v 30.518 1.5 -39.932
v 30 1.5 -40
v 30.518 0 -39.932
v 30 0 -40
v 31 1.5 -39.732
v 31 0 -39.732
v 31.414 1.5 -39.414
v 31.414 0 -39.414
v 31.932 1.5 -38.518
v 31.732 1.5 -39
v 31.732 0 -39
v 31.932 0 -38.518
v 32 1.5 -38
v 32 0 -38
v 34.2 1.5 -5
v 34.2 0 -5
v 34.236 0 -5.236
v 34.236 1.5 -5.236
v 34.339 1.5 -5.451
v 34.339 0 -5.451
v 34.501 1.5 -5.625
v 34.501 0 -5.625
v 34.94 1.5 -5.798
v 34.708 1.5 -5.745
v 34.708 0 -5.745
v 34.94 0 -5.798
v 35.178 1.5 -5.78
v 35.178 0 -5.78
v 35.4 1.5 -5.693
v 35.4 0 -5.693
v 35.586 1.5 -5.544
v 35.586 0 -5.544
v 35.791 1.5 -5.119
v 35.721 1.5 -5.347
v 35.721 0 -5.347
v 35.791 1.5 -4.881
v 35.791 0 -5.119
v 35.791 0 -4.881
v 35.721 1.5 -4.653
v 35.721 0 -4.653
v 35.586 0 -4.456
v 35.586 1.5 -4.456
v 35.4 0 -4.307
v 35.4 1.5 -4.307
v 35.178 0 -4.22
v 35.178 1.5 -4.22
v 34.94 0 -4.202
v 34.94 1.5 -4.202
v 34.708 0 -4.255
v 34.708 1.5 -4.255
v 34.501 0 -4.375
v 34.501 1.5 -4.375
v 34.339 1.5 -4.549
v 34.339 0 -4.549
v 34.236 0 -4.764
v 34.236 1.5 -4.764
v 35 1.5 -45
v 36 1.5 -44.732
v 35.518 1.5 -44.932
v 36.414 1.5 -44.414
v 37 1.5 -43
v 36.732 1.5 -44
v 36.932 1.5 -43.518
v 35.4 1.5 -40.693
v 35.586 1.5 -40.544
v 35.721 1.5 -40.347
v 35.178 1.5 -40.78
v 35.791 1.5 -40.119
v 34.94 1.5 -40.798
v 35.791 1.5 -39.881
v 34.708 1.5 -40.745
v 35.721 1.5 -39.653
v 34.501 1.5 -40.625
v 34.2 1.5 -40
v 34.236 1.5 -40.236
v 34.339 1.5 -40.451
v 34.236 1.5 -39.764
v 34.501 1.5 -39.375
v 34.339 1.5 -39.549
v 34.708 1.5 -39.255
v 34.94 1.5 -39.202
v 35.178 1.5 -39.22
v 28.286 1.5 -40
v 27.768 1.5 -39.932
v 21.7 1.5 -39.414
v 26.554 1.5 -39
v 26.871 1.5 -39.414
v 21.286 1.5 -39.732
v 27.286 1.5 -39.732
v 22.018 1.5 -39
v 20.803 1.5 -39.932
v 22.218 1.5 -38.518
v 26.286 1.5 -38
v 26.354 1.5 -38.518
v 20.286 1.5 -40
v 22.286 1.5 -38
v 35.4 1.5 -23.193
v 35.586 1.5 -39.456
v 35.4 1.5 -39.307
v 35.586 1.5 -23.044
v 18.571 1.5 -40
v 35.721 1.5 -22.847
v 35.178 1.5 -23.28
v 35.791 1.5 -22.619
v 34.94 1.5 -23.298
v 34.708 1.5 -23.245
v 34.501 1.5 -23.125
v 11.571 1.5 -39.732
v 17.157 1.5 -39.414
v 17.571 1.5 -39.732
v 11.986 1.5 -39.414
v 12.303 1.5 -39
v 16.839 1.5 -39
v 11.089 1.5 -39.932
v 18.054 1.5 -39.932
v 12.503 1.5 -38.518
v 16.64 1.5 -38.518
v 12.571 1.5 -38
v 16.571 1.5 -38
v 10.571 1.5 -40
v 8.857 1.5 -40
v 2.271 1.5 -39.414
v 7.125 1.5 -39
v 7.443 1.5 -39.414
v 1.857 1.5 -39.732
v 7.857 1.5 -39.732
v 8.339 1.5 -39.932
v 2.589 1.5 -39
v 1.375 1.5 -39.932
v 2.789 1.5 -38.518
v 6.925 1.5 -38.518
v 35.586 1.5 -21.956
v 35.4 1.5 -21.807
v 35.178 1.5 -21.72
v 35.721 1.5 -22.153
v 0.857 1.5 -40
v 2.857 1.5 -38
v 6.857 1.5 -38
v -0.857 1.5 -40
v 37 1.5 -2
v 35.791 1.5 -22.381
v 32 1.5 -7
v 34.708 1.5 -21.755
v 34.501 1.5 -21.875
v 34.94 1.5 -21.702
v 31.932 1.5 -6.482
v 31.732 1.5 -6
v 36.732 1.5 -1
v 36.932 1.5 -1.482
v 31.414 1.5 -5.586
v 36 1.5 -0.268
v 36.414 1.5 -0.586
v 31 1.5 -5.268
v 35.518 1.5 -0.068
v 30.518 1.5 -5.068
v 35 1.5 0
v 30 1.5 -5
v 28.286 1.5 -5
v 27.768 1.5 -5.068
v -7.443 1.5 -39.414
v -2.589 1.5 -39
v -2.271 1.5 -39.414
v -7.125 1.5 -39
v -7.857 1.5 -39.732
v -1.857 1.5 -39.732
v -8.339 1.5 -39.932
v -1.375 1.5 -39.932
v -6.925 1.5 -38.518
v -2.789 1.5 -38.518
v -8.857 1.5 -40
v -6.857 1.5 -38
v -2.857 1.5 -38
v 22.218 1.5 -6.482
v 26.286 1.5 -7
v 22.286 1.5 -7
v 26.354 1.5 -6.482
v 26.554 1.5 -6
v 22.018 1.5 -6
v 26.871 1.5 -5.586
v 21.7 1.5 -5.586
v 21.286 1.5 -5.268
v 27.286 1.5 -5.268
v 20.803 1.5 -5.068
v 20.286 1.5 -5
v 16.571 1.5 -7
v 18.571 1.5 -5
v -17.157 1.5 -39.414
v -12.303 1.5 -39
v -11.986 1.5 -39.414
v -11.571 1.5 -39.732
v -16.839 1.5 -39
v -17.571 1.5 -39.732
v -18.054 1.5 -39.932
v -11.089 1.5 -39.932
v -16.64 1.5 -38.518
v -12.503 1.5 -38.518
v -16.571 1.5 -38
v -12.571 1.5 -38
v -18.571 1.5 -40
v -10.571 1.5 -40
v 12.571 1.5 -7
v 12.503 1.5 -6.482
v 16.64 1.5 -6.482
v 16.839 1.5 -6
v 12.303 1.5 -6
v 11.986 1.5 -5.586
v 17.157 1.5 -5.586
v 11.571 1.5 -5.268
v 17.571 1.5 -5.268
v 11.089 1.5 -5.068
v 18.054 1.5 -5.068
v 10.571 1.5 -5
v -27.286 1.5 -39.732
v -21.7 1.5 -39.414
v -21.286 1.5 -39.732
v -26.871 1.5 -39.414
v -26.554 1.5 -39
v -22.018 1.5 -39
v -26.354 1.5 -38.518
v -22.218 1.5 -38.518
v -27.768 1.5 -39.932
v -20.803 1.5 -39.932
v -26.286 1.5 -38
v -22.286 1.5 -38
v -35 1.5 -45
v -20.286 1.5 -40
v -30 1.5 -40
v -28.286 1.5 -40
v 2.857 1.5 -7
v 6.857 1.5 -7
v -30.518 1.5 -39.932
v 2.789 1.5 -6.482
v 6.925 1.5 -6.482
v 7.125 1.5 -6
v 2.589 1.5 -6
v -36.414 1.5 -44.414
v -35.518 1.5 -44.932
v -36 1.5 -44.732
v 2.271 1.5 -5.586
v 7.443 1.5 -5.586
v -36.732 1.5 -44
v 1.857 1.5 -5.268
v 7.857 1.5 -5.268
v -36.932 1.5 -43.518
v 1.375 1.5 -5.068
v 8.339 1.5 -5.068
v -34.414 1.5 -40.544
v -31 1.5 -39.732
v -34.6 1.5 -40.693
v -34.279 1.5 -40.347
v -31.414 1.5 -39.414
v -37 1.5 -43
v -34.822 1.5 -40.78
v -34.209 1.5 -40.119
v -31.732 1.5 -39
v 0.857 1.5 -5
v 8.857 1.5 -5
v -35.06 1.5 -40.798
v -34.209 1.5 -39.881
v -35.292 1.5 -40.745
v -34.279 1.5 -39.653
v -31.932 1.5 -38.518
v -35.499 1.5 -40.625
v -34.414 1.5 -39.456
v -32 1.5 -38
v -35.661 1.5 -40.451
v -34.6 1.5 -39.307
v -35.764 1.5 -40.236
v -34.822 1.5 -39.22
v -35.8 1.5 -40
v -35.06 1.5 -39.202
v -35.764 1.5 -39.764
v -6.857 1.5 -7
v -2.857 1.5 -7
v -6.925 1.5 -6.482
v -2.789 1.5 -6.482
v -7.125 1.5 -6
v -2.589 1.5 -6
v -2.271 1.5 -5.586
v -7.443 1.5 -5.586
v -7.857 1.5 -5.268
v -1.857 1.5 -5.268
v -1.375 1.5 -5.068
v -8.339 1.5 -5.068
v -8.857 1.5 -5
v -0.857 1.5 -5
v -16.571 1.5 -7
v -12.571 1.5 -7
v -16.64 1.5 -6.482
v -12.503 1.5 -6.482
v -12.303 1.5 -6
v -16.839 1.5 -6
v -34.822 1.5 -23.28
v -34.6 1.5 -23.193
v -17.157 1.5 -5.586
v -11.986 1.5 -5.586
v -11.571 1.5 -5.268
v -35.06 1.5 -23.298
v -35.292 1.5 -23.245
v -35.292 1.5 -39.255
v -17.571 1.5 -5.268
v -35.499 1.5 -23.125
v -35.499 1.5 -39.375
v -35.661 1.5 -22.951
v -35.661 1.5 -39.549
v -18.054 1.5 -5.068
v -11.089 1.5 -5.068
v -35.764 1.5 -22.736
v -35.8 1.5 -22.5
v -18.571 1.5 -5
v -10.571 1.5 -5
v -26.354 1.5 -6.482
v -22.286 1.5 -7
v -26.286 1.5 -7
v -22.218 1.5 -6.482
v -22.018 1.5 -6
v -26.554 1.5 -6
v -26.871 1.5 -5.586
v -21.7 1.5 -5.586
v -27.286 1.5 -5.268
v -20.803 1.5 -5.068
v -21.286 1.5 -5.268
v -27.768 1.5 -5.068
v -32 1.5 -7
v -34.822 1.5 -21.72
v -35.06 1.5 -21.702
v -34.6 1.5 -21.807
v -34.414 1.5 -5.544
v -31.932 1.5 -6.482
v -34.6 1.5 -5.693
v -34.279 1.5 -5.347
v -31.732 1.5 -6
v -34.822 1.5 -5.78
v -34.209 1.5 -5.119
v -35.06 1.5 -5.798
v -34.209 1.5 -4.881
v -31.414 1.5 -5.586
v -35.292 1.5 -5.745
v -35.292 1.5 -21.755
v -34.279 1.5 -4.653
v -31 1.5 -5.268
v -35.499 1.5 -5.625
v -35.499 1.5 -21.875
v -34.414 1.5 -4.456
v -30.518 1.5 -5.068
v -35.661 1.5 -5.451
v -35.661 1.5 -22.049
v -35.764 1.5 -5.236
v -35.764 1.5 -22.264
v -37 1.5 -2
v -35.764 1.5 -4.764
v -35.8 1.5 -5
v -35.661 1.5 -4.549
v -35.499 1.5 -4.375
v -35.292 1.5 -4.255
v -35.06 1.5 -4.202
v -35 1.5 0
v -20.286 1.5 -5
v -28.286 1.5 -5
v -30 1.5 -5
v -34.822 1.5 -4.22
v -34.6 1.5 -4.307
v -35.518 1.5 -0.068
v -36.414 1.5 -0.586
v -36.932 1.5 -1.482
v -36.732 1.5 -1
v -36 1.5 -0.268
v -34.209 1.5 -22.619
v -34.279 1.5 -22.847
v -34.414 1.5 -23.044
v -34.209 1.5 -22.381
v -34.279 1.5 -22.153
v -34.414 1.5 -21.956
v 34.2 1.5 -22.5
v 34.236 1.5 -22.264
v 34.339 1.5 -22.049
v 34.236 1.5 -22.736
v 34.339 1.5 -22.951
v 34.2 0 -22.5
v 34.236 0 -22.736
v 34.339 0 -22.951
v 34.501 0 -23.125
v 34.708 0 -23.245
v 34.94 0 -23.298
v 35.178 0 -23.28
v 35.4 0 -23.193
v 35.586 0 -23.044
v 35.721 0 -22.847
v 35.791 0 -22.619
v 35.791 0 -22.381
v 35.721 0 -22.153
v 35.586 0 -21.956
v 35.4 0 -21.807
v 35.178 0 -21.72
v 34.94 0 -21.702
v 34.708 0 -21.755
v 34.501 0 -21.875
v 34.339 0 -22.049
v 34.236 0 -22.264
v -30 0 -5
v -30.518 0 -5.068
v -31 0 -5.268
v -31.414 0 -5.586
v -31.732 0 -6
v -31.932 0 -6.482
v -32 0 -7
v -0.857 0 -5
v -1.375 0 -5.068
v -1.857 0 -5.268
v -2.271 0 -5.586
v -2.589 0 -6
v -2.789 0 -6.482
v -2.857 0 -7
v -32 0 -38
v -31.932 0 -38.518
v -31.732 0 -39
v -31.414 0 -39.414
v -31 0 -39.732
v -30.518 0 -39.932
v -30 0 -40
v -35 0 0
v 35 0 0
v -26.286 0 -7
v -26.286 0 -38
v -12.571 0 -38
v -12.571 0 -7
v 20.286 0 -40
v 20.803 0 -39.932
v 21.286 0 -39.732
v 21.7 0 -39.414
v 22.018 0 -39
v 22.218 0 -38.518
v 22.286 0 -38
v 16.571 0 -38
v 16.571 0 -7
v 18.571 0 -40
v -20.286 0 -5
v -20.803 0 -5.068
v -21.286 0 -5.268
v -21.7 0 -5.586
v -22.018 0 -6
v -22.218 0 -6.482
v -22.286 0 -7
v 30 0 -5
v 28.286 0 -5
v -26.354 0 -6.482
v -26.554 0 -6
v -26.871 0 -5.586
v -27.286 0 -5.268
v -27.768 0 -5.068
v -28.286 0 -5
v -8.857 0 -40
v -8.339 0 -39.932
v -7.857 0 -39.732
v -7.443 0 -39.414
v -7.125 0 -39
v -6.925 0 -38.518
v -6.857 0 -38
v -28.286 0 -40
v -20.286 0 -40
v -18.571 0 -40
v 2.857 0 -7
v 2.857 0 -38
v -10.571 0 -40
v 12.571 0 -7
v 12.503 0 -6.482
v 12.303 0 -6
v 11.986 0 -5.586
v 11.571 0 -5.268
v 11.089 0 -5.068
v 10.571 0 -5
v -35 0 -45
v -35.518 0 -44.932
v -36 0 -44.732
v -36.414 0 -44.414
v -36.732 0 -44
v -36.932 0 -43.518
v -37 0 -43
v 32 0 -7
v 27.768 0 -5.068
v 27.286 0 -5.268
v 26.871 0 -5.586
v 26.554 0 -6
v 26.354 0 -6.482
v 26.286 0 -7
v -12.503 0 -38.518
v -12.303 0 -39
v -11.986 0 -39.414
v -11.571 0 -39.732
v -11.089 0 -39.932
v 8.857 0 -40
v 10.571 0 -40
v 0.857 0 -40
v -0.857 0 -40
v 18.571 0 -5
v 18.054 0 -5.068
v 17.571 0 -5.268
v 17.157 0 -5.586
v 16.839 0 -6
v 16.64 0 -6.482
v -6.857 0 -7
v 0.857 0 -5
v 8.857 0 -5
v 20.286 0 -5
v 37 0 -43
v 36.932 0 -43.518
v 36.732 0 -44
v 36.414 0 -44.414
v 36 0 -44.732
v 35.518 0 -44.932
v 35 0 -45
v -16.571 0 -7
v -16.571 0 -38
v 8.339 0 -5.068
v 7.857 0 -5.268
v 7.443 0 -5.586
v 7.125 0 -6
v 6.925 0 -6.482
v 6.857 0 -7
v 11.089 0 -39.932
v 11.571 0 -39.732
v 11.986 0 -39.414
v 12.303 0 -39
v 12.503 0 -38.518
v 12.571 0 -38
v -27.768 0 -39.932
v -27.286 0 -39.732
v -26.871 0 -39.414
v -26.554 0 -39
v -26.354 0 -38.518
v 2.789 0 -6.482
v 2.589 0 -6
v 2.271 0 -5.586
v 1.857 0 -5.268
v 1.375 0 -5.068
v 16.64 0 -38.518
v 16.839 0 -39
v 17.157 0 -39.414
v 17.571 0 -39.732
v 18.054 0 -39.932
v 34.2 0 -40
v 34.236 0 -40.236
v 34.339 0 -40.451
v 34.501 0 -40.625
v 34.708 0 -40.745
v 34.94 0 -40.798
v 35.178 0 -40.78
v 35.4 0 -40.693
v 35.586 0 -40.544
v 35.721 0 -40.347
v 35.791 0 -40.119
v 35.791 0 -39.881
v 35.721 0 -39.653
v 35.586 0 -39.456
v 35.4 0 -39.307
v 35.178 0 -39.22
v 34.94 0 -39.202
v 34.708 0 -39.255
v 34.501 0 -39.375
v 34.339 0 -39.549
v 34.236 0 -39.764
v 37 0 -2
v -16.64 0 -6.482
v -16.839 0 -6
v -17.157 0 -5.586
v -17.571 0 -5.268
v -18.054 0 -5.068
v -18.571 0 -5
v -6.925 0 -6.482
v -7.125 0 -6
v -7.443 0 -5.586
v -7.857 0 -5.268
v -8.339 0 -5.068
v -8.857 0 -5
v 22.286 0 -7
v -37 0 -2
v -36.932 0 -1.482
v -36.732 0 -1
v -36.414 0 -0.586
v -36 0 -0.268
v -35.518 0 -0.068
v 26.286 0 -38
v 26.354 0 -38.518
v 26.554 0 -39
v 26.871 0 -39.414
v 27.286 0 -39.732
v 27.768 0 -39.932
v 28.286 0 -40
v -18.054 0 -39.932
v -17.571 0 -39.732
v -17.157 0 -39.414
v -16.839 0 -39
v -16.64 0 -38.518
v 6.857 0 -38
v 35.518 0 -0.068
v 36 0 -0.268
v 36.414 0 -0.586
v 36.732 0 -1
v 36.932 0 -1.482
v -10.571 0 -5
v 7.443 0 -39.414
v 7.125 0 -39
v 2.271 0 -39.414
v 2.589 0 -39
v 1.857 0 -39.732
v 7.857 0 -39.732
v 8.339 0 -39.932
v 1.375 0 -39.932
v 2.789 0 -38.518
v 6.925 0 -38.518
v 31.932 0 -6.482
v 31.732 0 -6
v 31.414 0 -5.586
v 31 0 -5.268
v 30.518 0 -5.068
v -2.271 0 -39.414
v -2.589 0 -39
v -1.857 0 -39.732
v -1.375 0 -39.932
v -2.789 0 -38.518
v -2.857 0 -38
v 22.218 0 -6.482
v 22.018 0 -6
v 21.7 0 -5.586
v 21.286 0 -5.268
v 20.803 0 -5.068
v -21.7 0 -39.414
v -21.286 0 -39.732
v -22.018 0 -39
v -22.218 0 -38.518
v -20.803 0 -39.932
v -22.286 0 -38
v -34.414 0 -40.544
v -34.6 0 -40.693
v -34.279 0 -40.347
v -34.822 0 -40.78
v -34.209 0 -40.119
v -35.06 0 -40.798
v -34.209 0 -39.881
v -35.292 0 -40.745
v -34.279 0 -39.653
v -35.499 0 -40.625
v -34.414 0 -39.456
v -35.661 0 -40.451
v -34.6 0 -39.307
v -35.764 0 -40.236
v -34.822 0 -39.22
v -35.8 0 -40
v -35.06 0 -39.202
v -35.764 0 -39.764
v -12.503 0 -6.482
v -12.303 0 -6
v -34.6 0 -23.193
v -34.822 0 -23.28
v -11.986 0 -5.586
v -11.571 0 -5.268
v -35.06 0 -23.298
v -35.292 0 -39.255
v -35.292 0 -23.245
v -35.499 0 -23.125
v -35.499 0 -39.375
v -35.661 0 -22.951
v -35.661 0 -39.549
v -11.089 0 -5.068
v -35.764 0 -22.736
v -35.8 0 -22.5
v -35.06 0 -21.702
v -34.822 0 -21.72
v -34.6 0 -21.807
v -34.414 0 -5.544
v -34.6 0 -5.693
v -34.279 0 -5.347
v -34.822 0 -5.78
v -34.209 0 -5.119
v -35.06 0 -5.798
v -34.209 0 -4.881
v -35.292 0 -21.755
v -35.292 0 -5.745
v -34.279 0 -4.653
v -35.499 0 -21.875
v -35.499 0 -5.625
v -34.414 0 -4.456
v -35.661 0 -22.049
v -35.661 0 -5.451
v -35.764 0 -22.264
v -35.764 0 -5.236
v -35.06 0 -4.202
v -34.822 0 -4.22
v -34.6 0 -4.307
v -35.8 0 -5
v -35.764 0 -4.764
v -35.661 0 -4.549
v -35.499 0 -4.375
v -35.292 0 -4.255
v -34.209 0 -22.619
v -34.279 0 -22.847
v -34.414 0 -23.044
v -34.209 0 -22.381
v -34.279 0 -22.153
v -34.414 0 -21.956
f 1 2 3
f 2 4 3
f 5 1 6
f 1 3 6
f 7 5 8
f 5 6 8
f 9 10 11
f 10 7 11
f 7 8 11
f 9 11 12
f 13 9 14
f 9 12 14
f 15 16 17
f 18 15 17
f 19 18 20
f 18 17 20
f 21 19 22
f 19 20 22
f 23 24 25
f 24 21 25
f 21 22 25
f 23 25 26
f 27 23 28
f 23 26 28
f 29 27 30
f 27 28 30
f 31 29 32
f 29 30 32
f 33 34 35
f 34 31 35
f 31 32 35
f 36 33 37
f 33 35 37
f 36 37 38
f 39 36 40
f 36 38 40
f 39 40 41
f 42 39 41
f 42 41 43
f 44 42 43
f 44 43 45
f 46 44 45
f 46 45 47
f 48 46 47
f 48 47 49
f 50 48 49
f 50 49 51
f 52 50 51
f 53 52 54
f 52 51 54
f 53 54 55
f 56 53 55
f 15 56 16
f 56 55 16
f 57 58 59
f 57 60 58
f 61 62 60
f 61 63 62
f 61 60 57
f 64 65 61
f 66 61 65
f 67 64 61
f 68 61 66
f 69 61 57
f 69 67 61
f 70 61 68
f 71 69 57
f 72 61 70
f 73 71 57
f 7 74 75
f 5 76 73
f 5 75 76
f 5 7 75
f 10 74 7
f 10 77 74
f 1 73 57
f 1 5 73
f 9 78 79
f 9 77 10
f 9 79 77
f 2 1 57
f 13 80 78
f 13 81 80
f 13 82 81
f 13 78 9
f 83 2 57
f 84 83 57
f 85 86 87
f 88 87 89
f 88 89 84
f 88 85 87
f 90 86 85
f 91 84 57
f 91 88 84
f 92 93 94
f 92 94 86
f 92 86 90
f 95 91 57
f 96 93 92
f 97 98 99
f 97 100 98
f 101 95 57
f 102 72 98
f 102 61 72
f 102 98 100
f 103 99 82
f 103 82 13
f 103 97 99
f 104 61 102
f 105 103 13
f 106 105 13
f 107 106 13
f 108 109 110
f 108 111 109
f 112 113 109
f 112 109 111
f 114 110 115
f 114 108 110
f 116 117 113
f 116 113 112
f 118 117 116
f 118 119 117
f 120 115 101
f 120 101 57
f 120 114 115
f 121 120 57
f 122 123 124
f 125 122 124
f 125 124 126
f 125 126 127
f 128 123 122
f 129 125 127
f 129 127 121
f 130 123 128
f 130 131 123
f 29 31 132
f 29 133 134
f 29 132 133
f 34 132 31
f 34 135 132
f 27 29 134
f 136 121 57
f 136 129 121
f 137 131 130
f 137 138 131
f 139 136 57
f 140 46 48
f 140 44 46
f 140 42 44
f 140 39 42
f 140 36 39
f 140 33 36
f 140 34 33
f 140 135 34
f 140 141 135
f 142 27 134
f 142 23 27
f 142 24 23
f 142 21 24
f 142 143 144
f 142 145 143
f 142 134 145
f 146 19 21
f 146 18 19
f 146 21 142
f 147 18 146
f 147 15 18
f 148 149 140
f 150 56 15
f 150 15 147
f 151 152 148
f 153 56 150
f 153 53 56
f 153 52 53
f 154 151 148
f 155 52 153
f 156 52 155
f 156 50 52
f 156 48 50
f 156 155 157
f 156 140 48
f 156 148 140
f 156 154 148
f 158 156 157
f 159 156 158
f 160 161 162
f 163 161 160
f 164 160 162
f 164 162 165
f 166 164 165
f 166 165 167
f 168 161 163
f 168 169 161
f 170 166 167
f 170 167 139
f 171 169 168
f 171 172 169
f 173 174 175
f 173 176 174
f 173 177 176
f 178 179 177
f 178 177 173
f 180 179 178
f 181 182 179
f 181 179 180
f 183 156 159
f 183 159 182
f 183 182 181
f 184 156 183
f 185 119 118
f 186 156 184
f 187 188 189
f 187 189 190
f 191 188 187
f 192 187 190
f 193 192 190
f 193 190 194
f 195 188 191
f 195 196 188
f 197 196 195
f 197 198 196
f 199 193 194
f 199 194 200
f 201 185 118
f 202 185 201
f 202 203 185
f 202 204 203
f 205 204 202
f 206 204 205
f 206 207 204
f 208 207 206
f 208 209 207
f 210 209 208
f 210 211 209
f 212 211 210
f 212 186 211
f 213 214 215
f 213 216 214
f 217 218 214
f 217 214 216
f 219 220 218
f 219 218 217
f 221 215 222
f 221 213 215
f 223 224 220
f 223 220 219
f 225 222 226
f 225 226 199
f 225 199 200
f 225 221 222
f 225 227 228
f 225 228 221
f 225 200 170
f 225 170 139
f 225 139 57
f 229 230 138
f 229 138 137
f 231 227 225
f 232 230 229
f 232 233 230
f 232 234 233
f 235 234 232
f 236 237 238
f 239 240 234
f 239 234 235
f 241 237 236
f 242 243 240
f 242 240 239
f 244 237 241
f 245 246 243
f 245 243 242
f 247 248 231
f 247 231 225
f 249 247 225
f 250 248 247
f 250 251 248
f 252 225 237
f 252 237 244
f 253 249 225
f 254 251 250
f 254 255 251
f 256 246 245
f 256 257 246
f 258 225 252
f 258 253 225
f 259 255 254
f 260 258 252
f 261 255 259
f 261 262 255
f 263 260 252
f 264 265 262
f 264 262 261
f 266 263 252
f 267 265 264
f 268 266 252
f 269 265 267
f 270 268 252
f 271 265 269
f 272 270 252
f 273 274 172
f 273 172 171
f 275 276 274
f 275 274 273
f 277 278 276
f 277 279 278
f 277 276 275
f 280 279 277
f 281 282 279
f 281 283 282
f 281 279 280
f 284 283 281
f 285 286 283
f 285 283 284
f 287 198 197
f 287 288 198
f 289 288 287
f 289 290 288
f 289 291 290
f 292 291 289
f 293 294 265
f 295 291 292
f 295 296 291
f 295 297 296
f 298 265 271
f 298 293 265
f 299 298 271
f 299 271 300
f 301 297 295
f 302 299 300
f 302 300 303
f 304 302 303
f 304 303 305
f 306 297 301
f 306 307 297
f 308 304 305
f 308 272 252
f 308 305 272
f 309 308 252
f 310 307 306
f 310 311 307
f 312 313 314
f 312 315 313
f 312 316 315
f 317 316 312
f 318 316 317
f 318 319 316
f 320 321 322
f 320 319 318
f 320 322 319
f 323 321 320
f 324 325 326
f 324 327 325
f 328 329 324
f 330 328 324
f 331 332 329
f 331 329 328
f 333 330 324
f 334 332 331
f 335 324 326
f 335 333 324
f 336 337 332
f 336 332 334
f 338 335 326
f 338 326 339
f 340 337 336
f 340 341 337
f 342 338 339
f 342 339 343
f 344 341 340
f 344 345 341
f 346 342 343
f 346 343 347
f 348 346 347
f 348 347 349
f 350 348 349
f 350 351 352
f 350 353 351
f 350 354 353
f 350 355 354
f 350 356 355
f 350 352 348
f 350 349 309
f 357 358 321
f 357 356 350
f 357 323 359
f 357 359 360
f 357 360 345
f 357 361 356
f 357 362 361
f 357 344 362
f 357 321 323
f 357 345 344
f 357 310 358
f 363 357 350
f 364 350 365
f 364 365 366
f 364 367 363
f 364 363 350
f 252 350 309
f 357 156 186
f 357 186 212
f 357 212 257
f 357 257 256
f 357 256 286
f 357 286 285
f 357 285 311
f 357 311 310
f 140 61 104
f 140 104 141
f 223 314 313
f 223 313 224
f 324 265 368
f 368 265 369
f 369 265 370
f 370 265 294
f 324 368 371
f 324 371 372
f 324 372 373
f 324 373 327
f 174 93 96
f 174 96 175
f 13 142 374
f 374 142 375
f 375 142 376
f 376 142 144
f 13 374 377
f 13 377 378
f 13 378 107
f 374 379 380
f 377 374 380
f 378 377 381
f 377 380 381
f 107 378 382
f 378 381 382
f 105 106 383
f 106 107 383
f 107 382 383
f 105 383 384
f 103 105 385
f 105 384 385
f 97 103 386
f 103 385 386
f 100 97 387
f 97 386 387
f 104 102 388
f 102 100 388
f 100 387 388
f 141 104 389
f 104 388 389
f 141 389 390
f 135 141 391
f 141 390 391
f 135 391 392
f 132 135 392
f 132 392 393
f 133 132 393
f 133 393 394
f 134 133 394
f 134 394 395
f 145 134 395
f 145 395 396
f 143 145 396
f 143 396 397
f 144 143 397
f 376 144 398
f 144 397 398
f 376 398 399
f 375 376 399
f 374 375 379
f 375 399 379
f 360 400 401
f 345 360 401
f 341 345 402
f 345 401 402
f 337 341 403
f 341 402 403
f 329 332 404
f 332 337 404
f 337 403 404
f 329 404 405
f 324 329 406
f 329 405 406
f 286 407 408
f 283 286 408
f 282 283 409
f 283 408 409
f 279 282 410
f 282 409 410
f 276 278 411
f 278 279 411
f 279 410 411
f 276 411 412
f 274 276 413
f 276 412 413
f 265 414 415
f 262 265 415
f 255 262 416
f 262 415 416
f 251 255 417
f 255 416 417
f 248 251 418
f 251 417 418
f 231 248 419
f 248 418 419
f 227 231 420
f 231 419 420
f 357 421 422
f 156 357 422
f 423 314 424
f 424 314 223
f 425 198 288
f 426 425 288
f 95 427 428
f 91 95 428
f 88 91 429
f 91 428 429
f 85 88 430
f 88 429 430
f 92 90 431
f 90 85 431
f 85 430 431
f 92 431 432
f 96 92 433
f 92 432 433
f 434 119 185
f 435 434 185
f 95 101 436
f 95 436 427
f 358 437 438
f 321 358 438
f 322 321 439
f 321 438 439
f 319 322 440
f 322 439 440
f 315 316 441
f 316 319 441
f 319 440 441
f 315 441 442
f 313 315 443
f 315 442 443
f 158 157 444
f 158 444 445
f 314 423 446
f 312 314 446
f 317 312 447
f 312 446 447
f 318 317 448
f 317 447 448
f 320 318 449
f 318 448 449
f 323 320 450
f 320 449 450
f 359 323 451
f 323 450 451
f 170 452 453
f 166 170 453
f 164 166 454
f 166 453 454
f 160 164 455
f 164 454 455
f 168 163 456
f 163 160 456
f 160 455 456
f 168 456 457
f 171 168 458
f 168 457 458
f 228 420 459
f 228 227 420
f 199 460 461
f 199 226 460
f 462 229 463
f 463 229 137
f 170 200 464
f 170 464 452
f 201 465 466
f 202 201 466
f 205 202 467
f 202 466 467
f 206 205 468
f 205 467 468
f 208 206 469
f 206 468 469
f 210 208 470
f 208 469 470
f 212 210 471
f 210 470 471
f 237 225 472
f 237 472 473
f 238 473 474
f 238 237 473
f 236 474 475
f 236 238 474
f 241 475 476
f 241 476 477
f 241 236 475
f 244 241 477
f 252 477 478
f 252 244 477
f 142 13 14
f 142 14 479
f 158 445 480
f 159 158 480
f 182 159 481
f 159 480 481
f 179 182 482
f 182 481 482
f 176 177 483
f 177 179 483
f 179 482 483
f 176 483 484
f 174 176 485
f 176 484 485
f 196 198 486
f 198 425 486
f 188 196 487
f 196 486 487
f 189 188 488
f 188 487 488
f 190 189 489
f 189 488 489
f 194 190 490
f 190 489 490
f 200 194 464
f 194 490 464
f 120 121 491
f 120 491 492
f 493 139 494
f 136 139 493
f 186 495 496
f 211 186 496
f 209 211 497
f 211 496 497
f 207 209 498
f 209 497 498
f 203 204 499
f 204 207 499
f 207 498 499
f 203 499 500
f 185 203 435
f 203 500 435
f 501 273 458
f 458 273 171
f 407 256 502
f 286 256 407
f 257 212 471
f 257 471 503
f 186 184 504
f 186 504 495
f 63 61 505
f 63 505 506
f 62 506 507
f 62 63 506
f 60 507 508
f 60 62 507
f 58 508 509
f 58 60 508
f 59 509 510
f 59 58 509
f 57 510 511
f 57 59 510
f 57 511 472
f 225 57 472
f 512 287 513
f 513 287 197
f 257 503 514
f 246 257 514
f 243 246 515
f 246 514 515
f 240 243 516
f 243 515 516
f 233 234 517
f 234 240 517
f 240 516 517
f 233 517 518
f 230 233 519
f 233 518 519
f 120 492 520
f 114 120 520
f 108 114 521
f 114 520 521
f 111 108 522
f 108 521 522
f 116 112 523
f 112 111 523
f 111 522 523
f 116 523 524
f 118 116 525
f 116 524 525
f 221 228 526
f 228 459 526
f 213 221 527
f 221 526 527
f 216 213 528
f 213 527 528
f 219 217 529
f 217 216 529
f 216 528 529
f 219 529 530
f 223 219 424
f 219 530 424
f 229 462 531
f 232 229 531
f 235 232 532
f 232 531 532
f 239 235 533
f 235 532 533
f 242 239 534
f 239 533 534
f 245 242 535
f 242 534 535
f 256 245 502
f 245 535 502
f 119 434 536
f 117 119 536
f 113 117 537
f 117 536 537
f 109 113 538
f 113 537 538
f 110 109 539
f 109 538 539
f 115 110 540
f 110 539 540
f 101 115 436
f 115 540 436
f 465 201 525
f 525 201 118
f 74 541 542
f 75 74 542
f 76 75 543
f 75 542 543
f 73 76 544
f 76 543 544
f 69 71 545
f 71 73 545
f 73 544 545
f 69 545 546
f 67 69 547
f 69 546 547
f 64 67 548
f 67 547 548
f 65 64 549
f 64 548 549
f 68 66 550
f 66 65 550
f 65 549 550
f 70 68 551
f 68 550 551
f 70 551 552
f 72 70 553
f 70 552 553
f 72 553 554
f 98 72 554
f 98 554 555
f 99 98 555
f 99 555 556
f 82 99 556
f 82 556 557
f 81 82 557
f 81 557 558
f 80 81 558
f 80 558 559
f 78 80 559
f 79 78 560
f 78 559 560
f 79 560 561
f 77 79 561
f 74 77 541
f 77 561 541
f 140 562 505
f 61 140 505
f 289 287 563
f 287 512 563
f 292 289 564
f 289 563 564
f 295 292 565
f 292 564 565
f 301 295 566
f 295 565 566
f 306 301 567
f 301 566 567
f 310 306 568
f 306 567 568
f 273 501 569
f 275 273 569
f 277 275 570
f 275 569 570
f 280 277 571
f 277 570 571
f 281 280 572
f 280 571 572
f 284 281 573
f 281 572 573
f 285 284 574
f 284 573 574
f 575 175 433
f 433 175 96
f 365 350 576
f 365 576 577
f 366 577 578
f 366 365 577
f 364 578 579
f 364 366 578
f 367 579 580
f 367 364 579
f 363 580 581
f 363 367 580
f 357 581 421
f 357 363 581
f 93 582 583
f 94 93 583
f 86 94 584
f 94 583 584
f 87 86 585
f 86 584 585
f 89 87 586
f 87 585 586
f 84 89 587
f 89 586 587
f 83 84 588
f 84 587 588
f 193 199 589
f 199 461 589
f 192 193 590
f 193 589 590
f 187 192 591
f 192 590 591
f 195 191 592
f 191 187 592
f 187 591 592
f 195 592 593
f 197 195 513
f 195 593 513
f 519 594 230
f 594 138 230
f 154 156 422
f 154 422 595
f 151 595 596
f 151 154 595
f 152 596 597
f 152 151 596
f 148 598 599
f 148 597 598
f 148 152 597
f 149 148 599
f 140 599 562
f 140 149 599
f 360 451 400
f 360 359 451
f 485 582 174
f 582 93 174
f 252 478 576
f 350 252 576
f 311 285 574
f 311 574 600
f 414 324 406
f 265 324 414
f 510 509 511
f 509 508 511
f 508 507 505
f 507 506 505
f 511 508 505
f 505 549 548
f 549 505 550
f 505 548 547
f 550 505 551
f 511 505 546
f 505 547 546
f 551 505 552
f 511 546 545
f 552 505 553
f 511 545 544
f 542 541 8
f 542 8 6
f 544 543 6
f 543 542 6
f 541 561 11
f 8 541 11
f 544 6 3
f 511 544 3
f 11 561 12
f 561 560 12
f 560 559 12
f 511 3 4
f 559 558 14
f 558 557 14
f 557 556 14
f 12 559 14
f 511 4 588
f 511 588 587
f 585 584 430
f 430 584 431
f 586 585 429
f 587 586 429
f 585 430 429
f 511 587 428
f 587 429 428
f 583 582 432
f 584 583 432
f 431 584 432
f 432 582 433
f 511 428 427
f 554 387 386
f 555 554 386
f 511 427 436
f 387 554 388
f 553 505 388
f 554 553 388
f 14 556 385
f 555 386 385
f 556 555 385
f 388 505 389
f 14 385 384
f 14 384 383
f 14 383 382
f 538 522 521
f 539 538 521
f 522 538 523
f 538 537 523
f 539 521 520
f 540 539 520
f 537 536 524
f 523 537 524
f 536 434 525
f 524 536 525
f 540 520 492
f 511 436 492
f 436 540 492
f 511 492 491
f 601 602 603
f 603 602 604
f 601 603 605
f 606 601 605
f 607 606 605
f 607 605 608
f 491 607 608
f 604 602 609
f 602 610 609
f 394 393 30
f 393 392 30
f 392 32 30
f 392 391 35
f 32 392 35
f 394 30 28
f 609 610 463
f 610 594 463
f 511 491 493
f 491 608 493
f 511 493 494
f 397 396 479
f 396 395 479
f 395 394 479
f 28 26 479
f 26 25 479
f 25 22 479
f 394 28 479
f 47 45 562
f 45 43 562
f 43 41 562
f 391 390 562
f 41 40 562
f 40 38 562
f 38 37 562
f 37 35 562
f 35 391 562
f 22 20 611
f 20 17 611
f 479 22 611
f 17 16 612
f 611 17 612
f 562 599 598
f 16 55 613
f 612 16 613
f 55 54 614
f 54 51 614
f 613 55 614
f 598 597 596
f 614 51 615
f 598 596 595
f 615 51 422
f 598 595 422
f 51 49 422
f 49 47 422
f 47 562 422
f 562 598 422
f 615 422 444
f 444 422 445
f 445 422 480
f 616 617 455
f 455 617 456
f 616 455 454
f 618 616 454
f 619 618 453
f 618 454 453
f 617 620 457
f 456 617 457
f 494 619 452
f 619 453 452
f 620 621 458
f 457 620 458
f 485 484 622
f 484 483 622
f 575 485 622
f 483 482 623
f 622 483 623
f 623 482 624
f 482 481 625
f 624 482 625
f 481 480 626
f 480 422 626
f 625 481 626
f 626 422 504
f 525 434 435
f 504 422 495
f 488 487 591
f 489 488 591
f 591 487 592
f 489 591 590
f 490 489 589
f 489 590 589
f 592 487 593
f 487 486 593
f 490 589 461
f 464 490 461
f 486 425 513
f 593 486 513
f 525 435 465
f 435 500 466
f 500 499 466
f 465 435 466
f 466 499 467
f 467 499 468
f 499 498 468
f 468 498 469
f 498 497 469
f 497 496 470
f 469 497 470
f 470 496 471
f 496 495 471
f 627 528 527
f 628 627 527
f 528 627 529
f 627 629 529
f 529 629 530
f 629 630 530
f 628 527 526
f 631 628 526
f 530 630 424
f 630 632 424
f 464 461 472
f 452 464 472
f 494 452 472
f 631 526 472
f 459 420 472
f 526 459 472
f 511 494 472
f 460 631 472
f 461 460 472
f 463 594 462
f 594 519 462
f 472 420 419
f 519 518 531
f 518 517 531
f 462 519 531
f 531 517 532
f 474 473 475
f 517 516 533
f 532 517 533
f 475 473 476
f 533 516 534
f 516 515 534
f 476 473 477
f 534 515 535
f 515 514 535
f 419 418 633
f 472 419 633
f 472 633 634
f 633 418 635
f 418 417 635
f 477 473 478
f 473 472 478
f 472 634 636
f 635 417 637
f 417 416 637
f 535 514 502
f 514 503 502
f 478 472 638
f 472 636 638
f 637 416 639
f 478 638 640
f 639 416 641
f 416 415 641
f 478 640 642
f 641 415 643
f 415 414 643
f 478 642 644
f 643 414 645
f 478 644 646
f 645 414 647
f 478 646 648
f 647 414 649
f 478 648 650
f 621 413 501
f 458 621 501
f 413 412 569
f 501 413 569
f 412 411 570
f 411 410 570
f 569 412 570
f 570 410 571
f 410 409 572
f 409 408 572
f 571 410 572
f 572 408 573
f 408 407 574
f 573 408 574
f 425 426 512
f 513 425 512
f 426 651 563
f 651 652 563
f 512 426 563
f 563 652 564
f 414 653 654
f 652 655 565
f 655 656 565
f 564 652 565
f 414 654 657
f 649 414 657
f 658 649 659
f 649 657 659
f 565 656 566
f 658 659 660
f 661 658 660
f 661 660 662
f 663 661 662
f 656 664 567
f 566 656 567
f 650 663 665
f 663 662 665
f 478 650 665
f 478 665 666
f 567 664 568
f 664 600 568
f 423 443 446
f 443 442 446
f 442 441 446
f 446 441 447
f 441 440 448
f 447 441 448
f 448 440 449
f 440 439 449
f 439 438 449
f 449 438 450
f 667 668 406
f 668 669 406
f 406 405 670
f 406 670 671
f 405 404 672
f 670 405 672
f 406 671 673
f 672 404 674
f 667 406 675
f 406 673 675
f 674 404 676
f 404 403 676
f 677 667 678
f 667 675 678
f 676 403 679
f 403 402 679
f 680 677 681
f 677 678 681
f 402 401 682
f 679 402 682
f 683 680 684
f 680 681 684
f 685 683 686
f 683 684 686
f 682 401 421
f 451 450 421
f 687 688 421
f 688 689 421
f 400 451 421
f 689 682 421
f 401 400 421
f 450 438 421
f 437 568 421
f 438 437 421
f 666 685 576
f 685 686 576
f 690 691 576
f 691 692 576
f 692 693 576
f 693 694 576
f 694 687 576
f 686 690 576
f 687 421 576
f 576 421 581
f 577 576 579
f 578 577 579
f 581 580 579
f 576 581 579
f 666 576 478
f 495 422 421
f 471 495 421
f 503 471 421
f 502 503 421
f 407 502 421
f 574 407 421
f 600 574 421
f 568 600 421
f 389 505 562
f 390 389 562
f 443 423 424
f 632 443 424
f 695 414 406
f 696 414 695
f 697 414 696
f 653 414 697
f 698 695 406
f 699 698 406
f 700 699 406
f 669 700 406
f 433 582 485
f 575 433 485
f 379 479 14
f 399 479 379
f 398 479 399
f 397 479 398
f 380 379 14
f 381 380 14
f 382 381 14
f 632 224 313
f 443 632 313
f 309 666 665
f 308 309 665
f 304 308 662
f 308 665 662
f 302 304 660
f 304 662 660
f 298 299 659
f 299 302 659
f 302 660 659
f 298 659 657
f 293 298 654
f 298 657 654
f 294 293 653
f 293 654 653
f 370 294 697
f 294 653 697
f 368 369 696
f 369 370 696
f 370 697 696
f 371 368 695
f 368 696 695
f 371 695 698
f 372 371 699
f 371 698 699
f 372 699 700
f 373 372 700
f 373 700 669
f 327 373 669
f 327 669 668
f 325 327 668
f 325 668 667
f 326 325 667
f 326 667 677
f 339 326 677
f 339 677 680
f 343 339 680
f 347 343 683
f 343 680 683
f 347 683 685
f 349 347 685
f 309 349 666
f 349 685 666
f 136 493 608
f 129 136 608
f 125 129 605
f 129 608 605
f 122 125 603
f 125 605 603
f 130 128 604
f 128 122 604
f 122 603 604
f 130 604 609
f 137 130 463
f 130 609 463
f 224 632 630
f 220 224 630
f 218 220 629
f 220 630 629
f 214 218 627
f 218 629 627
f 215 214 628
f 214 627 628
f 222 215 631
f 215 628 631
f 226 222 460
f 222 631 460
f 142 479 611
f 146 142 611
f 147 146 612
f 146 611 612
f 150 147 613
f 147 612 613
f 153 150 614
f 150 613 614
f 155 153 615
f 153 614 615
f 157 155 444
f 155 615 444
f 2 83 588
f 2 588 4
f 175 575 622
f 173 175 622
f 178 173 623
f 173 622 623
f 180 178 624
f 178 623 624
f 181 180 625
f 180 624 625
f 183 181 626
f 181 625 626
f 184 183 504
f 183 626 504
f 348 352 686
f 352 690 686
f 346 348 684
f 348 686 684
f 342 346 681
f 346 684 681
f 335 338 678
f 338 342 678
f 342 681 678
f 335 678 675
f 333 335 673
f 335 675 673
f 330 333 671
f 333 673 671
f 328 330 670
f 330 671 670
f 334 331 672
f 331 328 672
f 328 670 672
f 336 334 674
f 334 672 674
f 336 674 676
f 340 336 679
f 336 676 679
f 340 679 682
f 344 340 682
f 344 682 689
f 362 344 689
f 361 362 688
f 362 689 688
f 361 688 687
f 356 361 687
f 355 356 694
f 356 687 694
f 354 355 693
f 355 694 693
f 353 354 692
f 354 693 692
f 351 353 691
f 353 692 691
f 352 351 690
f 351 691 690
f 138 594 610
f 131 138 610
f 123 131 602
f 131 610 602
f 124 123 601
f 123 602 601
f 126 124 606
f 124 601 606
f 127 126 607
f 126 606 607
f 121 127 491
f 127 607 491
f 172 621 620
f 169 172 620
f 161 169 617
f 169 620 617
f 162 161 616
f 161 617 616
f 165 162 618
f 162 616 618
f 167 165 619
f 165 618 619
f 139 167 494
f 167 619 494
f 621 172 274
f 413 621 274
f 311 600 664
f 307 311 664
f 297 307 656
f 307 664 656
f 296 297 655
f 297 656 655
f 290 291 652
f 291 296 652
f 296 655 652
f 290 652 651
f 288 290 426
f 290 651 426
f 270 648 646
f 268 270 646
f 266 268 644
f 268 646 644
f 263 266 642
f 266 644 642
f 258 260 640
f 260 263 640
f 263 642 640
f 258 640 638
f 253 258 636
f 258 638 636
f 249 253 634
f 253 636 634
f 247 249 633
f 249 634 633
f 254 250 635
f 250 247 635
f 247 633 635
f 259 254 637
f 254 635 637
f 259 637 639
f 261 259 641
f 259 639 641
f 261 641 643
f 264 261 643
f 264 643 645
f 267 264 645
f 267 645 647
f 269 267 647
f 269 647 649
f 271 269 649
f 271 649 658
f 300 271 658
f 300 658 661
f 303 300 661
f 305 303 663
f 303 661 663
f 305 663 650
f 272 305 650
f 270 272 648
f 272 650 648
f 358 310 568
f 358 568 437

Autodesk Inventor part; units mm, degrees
ref_plane "YZ Plane" through (0, 0, 0) normal (1, 0, 0) x (0, 1, 0)
ref_plane "XZ Plane" through (0, 0, 0) normal (0, 1, 0) x (-1, 0, 0)
ref_plane "XY Plane" through (0, 0, 0) normal (0, 0, 1) x (1, 0, 0)
sketch "スケッチ1" plane through (0, 0, 0) normal (0, 1, 0) x (-1, 0, 0)
  line L0 (30, 0) -> (-30, 0)
  line L1 (-30, 0) -> (-30, -45)
  line L2 (-30, -45) -> (30, -45)
  line L3 (30, -45) -> (30, 0)
  line L4 (37, 0) -> (30, 0)
  line L5 (30, 0) -> (30, -45)
  line L6 (30, -45) -> (37, -45)
  line L7 (37, -45) -> (37, 0)
  line L8 (-30, 0) -> (-37, 0)
  line L9 (-37, 0) -> (-37, -45)
  line L10 (-37, -45) -> (-30, -45)
  line L11 (-30, -45) -> (-30, 0)
  line L12 (37, 0) -> (35, 0)
  line L13 (35, 0) -> (35, -45) construction
  line L14 (35, -45) -> (37, -45)
  line L15 (37, -45) -> (37, 0)
  line L16 (-37, 0) -> (-35, 0)
  line L17 (-35, 0) -> (-35, -45) construction
  line L18 (-35, -45) -> (-37, -45)
  line L19 (-37, -45) -> (-37, 0)
  circle A0 centre (35, -5) radius 0.8
  circle A1 centre (35, -40) radius 0.8
  circle A2 centre (-35, -5) radius 0.8
  circle A3 centre (-35, -40) radius 0.8
  circle A4 centre (-35, -22.5) radius 0.8
  circle A5 centre (35, -22.5) radius 0.8
  point P0 (0, 0)
  point P1 (0, 0)
  point P2 (30, 0)
  dimension "d0" = 60
  dimension "d1" = 45
  dimension "d4" = 7
  dimension "d5" = 2
  dimension "d6" = 2
  dimension "d7" = 1.6
  dimension "d8" = 1.6
  dimension "d9" = 1.6
  dimension "d10" = 1.6
  dimension "d11" = 5
  dimension "d12" = 5
  dimension "d13" = 1.6
  dimension "d14" = 1.6
extrude "押し出し1" add sketch "スケッチ1" along normal blind 1.5
sketch "スケッチ2" plane through (0, 1.5, 0) normal (0, 1, 0) x (1, 0, 0)
  circle A0 centre (-35, 40) radius 0.8 projected
  circle A1 centre (35, 5) radius 0.8 projected
  line L0 (-35, 40) -> (35, 40)
  line L1 (35, 40) -> (35, 5)
  line L2 (35, 5) -> (-35, 5)
  line L3 (-35, 5) -> (-35, 40)
  line L4 (-32, 40) -> (32, 40)
  line L5 (32, 40) -> (32, 5)
  line L6 (32, 5) -> (-32, 5)
  line L7 (-32, 5) -> (-32, 40)
  line L8 (-26.2857, 40) -> (-22.2857, 40)
  line L9 (-22.2857, 40) -> (-22.2857, 5)
  line L10 (-22.2857, 5) -> (-26.2857, 5)
  line L11 (-26.2857, 5) -> (-26.2857, 40)
  line L12 (-16.5714, 40) -> (-12.5714, 40)
  line L13 (-12.5714, 40) -> (-12.5714, 5)
  line L14 (-12.5714, 5) -> (-16.5714, 5)
  line L15 (-16.5714, 5) -> (-16.5714, 40)
  line L16 (-6.8571, 40) -> (-2.8571, 40)
  line L17 (-2.8571, 40) -> (-2.8571, 5)
  line L18 (-2.8571, 5) -> (-6.8571, 5)
  line L19 (-6.8571, 5) -> (-6.8571, 40)
  line L20 (2.8571, 40) -> (6.8571, 40)
  line L21 (6.8571, 40) -> (6.8571, 5)
  line L22 (6.8571, 5) -> (2.8571, 5)
  line L23 (2.8571, 5) -> (2.8571, 40)
  line L24 (12.5714, 40) -> (16.5714, 40)
  line L25 (16.5714, 40) -> (16.5714, 5)
  line L26 (16.5714, 5) -> (12.5714, 5)
  line L27 (12.5714, 5) -> (12.5714, 40)
  line L28 (22.2857, 40) -> (26.2857, 40)
  line L29 (26.2857, 40) -> (26.2857, 5)
  line L30 (26.2857, 5) -> (22.2857, 5)
  line L31 (22.2857, 5) -> (22.2857, 40)
  point P0 (0, 0)
  point P1 (32, 40)
  point P2 (6.8571, 5)
  dimension "d16" = 3
  dimension "d17" = 3
  dimension "d18" = 4
  dimension "d19" = 5.7143
  dimension "d20" = 5.7143
  dimension "d21" = 5.7143
  dimension "d22" = 5.7143
  dimension "d23" = 5.7143
  dimension "d24" = 5.7143
  dimension "d25" = 5.7143
extrude "押し出し2" cut sketch "スケッチ2" against normal through all contours L0 L11 L2 L7 | L0 L15 L2 L9 | L0 L19 L2 L13 | L0 L23 L2 L17 | L0 L27 L2 L21 | L0 L31 L2 L25 | L0 L5 L2 L29
fillet "フィレット1" radius 2 32 edges at (-37, 0.75, 0) (-37, 0.75, -45) (37, 0.75, 0) (37, 0.75, -45) (-32, 0.75, -40) (-22.2857, 0.75, -40) (-12.5714, 0.75, -40) (-2.8571, 0.75, -40) (6.8571, 0.75, -40) (16.5714, 0.75, -40) (26.2857, 0.75, -40) (32, 0.75, -40) (22.2857, 0.75, -40) (12.5714, 0.75, -40) (2.8571, 0.75, -40) (-6.8571, 0.75, -40) (-16.5714, 0.75, -40) (-26.2857, 0.75, -40) (-26.2857, 0.75, -5) (-16.5714, 0.75, -5) (-6.8571, 0.75, -5) (2.8571, 0.75, -5) (12.5714, 0.75, -5) (22.2857, 0.75, -5) (32, 0.75, -5) (-32, 0.75, -5) (-22.2857, 0.75, -5) (-12.5714, 0.75, -5) (-2.8571, 0.75, -5) (6.8571, 0.75, -5) (16.5714, 0.75, -5) (26.2857, 0.75, -5)
equation "\"d19\" = d25"
equation "\"d20\" = d25"
equation "\"d21\" = d25"
equation "\"d22\" = d25"
equation "\"d23\" = d25"
equation "\"d24\" = d25"
properties part number "chest_cover_top"
